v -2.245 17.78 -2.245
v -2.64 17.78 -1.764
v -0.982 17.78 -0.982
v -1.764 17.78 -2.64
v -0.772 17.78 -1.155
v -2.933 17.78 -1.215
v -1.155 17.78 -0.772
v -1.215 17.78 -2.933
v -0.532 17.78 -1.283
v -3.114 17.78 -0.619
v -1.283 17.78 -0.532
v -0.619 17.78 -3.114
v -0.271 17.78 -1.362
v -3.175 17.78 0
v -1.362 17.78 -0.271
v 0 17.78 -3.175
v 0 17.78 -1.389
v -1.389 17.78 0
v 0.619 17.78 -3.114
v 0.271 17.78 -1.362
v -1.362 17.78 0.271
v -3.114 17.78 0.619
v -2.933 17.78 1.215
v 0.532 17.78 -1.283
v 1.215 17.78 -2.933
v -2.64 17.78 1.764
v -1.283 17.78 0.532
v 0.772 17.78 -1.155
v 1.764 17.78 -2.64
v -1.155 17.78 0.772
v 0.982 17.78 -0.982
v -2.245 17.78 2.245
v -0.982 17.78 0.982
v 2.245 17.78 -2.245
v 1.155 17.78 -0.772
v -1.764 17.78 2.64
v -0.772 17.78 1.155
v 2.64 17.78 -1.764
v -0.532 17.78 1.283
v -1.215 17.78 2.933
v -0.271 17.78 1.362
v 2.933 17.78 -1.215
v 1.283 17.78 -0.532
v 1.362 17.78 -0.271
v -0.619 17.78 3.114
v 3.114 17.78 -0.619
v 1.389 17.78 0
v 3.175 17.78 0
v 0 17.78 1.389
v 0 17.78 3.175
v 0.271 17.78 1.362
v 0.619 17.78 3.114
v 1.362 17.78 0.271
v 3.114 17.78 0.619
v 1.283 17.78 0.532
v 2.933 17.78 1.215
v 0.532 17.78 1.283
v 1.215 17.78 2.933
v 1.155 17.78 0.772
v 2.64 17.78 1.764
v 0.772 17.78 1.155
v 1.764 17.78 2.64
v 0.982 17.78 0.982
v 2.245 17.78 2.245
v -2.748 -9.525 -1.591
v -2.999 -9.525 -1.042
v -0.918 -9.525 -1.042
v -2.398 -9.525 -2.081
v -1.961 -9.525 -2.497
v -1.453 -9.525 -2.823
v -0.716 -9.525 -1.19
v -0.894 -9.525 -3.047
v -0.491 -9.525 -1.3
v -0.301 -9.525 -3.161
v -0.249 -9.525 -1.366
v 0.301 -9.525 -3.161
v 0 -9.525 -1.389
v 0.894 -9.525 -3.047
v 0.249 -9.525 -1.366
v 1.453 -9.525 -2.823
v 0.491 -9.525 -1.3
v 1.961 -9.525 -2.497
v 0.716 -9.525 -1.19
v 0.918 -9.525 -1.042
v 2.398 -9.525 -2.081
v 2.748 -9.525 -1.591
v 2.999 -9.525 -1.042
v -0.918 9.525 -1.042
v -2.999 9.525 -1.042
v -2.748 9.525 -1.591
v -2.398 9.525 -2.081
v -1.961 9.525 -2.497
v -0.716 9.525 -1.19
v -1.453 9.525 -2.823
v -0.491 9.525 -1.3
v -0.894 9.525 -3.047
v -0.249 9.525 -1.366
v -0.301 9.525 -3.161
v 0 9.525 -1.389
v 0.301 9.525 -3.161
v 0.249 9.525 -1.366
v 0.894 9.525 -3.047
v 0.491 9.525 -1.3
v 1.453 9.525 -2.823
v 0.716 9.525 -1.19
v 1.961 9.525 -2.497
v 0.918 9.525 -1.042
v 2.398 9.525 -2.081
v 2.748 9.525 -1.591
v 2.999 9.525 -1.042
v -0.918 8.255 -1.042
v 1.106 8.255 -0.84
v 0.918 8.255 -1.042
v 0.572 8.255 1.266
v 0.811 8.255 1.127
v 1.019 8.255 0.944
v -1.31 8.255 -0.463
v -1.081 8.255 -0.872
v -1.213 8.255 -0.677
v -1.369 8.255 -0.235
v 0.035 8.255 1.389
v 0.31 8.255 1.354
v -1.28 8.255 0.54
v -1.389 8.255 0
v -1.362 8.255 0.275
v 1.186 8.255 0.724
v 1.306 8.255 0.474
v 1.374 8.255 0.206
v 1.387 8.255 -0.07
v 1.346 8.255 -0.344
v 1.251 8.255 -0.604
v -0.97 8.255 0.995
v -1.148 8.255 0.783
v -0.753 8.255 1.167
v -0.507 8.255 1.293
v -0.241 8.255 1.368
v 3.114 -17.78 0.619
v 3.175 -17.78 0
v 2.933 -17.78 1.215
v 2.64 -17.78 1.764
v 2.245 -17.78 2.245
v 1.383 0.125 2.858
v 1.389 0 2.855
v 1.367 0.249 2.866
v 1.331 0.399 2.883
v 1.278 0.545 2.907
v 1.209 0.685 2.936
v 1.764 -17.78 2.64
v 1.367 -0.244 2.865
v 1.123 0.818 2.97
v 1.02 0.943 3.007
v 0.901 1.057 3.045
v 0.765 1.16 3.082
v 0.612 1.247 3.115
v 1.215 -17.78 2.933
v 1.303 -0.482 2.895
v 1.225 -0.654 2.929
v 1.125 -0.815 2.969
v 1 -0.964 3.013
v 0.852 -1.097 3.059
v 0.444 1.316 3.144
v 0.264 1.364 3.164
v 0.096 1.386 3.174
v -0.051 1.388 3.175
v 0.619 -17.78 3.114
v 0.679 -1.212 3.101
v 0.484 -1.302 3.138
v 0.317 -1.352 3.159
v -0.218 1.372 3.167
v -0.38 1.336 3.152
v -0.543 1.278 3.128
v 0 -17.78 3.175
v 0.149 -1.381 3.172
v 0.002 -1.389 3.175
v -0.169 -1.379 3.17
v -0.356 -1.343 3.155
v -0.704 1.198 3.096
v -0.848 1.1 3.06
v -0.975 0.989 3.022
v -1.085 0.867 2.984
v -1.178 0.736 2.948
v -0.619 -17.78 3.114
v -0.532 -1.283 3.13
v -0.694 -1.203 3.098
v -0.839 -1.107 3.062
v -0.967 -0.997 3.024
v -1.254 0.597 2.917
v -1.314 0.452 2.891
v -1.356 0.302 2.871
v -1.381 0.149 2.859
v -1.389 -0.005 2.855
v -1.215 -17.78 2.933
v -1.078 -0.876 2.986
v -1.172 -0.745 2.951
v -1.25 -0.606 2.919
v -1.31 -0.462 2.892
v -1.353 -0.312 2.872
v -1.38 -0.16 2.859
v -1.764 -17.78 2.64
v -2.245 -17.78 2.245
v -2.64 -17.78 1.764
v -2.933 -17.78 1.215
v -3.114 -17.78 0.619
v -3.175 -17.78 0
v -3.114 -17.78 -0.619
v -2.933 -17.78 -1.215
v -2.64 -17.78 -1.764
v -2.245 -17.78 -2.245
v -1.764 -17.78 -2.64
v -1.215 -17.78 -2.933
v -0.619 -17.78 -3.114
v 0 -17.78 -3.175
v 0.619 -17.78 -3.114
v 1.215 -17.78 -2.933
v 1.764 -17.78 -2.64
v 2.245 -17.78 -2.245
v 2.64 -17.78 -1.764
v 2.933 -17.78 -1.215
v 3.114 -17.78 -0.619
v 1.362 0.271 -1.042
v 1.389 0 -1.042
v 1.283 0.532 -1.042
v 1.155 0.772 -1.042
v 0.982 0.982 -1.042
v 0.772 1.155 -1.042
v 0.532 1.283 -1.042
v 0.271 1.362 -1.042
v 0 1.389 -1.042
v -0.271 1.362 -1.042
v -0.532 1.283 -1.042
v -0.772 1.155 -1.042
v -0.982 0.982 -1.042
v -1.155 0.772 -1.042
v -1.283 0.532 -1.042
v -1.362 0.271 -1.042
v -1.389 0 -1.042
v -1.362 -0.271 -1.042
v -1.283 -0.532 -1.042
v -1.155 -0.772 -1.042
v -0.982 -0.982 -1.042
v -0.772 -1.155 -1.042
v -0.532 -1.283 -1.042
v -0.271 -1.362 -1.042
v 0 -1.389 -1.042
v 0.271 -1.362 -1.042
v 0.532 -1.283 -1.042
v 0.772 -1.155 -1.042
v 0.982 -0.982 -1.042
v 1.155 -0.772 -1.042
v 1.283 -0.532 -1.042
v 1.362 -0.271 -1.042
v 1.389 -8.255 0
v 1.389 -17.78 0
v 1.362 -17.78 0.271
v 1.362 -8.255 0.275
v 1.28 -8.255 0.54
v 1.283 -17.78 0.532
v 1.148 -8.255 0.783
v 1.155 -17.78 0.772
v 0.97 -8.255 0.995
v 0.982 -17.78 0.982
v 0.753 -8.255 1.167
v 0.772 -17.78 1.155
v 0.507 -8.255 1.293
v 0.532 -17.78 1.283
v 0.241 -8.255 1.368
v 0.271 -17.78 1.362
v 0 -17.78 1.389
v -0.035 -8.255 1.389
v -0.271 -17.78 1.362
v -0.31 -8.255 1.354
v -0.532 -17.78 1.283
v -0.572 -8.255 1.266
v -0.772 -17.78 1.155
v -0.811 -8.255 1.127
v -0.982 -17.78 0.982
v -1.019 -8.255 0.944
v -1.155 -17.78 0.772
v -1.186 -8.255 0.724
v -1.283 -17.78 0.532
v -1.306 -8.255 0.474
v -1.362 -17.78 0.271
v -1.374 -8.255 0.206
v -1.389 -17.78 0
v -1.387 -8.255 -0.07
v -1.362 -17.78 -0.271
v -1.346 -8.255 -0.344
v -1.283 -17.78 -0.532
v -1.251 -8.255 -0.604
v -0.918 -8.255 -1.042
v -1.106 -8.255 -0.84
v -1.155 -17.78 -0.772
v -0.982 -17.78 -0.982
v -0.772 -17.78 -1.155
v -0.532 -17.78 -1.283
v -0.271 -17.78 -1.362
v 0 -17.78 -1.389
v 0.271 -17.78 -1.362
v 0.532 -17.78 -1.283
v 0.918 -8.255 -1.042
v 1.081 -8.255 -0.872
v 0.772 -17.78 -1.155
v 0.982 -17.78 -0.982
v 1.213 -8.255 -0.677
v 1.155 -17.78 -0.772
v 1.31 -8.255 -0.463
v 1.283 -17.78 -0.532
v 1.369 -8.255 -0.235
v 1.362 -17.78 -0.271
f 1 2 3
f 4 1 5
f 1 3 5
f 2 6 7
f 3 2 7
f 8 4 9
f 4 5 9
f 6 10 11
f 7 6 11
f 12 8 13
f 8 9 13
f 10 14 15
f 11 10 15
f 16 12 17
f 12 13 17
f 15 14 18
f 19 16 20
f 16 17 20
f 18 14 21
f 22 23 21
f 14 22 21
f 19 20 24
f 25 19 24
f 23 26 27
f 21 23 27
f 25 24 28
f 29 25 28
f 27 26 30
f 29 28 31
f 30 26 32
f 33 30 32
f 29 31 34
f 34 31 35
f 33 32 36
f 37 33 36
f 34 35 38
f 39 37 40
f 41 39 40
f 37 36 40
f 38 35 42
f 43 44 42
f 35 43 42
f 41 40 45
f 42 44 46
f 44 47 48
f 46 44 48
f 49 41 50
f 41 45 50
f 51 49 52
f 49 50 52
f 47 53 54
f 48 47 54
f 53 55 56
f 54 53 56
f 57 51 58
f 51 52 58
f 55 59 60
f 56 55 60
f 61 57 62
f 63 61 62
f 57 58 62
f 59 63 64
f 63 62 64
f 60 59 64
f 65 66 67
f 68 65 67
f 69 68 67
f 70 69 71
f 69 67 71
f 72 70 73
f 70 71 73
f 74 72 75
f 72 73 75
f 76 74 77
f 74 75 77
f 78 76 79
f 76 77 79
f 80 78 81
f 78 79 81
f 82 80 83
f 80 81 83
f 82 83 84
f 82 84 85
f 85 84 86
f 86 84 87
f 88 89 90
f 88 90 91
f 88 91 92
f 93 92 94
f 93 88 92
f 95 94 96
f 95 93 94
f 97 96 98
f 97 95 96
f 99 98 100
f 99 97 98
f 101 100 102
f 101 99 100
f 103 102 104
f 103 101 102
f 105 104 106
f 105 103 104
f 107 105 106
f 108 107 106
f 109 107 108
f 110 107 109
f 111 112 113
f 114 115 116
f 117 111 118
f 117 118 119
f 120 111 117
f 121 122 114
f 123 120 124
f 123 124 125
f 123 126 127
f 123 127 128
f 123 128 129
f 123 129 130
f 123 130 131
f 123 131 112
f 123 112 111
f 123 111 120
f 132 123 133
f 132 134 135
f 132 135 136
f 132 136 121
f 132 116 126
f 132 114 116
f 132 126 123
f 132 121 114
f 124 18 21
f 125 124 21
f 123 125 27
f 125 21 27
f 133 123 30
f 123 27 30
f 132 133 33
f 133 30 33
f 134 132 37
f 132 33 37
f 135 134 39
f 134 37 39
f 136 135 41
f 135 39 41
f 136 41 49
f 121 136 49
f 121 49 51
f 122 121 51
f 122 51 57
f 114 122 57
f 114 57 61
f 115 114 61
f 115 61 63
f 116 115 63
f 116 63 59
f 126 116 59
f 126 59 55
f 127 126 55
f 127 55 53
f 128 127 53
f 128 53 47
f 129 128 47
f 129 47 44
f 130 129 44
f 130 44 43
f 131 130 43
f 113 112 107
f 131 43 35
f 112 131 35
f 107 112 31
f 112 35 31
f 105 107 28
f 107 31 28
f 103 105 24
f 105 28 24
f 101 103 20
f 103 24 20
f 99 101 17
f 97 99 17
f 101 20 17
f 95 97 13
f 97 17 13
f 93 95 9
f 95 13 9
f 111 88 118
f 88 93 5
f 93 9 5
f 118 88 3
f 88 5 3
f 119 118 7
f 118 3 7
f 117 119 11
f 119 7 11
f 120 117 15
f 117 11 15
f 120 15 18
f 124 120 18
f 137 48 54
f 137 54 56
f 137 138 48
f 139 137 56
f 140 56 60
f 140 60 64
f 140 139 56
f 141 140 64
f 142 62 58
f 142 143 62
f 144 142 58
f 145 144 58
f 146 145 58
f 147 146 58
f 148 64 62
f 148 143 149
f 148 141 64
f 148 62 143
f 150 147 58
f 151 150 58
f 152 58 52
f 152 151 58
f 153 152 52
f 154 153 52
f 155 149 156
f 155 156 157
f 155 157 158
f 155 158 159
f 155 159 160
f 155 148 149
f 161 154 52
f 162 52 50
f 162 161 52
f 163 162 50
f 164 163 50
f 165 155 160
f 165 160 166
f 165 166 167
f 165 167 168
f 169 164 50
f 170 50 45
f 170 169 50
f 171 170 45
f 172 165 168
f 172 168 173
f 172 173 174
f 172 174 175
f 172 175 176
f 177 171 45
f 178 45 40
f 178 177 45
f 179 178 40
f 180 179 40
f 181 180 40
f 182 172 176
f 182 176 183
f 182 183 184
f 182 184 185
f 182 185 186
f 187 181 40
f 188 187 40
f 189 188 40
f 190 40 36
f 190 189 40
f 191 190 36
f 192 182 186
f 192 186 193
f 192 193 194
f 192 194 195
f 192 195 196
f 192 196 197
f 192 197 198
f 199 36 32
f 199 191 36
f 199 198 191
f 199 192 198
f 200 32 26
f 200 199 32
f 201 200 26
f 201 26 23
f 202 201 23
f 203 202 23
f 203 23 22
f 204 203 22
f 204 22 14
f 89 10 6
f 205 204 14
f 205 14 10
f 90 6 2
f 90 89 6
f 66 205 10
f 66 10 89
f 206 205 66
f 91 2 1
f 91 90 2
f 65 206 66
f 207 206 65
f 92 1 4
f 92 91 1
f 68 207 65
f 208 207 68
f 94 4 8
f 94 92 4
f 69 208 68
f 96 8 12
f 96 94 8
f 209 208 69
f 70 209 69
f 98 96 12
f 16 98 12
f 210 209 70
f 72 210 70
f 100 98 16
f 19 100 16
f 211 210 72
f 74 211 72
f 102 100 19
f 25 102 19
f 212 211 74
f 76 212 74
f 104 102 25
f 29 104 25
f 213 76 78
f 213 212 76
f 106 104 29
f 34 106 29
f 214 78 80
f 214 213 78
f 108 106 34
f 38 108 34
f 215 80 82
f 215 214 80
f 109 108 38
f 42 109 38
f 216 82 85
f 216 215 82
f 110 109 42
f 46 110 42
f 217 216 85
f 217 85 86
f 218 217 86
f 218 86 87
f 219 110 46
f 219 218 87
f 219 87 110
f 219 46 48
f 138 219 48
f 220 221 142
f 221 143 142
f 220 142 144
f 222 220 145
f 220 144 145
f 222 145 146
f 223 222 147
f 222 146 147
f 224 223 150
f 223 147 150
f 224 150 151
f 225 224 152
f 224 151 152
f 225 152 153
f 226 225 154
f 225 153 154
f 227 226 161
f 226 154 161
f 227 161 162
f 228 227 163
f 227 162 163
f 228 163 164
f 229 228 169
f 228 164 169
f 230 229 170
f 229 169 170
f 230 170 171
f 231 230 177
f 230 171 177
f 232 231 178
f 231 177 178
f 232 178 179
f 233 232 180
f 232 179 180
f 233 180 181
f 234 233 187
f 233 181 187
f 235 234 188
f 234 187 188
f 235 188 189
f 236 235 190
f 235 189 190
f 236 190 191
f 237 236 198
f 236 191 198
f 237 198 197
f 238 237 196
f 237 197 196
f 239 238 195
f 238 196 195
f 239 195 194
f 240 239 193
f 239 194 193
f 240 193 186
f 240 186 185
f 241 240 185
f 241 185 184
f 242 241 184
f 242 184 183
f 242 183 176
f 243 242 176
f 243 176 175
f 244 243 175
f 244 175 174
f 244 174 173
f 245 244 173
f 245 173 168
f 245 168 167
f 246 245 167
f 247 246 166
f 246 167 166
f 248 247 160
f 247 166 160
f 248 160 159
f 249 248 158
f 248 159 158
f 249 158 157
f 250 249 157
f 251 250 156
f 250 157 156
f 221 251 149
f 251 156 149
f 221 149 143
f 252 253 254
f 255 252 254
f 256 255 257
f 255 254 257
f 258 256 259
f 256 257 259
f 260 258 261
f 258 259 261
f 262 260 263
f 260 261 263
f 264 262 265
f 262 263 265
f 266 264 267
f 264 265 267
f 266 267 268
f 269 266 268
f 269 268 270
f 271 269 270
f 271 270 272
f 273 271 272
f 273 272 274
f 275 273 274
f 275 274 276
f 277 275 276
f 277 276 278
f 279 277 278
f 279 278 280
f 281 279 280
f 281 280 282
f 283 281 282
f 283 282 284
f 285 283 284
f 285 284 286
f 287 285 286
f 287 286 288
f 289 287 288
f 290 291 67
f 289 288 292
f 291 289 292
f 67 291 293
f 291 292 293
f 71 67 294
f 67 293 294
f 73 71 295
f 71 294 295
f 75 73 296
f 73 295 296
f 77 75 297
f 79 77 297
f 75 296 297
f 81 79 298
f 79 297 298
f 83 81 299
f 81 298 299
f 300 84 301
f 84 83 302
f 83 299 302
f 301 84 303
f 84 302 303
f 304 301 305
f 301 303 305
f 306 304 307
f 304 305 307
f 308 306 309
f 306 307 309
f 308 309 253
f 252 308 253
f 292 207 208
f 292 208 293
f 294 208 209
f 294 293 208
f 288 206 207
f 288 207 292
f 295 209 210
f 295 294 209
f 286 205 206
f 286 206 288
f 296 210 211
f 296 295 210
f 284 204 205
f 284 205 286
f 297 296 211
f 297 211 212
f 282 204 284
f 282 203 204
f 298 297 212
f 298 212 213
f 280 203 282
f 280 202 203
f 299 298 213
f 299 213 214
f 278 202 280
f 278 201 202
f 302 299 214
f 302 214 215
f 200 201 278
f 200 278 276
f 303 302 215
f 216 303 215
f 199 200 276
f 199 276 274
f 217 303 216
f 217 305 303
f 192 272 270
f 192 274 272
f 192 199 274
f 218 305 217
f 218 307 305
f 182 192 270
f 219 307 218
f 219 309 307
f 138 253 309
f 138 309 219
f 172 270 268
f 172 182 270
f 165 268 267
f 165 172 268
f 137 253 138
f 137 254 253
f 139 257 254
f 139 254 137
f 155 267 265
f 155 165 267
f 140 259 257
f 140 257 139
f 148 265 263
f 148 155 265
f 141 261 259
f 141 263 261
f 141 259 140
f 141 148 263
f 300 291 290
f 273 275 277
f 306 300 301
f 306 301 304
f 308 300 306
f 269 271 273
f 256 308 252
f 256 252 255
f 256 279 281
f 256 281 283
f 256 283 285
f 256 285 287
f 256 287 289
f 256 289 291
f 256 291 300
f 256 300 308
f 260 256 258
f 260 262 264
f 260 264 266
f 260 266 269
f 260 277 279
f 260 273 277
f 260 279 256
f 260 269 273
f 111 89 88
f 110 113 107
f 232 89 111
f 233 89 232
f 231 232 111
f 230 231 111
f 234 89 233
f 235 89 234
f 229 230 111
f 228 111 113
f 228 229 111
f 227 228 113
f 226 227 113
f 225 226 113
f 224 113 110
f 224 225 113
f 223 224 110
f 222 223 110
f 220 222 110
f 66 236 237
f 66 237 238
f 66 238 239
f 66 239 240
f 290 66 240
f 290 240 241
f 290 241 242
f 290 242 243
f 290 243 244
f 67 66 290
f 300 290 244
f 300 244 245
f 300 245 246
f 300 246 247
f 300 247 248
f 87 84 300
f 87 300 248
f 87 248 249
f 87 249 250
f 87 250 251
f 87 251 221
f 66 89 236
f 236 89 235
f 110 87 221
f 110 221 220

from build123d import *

# Parameters (mm, degrees)
F0_R     = 3.175
F1_DEPTH = 17.78
F2_R     = 1.3890625
F3_DEPTH = 9.525
F4_R     = 1.3890625
F5_DEPTH = 9.525
F6_W     = 19.05
F6_H     = 2.159
F7_DEPTH = 9.525
F8_R     = 1.3890625
F9_DEPTH = 3.175


with BuildPart() as f1:
    # F0 (on Front) → F1 (new body, symmetric)
    with BuildSketch(Plane.XZ):
        Circle(F0_R)
    extrude(amount=F1_DEPTH, both=True)

    # F2 (on face) → F3 (cut)
    with BuildSketch(Plane.XZ.offset(17.78)):
        Circle(F2_R)
    extrude(amount=-F3_DEPTH, mode=Mode.SUBTRACT)

    # F4 (on face) → F5 (cut)
    with BuildSketch(Plane(origin=(0, 17.78, 0), x_dir=(-1, 0, 0), z_dir=(0, 1, 0))):
        Circle(F4_R)
    extrude(amount=-F5_DEPTH, mode=Mode.SUBTRACT)

    # F6 (on Front) → F7 (cut, symmetric)
    with BuildSketch(Plane.XZ):
        with Locations((-0.3555464804, -2.1219391367)):
            Rectangle(F6_W, F6_H)
    extrude(amount=F7_DEPTH, both=True, mode=Mode.SUBTRACT)

    # F8 (on Top) → F9 (cut, symmetric)
    with BuildSketch(Plane.XY):
        Circle(F8_R)
    extrude(amount=F9_DEPTH, both=True, mode=Mode.SUBTRACT)


solid = f1.part
